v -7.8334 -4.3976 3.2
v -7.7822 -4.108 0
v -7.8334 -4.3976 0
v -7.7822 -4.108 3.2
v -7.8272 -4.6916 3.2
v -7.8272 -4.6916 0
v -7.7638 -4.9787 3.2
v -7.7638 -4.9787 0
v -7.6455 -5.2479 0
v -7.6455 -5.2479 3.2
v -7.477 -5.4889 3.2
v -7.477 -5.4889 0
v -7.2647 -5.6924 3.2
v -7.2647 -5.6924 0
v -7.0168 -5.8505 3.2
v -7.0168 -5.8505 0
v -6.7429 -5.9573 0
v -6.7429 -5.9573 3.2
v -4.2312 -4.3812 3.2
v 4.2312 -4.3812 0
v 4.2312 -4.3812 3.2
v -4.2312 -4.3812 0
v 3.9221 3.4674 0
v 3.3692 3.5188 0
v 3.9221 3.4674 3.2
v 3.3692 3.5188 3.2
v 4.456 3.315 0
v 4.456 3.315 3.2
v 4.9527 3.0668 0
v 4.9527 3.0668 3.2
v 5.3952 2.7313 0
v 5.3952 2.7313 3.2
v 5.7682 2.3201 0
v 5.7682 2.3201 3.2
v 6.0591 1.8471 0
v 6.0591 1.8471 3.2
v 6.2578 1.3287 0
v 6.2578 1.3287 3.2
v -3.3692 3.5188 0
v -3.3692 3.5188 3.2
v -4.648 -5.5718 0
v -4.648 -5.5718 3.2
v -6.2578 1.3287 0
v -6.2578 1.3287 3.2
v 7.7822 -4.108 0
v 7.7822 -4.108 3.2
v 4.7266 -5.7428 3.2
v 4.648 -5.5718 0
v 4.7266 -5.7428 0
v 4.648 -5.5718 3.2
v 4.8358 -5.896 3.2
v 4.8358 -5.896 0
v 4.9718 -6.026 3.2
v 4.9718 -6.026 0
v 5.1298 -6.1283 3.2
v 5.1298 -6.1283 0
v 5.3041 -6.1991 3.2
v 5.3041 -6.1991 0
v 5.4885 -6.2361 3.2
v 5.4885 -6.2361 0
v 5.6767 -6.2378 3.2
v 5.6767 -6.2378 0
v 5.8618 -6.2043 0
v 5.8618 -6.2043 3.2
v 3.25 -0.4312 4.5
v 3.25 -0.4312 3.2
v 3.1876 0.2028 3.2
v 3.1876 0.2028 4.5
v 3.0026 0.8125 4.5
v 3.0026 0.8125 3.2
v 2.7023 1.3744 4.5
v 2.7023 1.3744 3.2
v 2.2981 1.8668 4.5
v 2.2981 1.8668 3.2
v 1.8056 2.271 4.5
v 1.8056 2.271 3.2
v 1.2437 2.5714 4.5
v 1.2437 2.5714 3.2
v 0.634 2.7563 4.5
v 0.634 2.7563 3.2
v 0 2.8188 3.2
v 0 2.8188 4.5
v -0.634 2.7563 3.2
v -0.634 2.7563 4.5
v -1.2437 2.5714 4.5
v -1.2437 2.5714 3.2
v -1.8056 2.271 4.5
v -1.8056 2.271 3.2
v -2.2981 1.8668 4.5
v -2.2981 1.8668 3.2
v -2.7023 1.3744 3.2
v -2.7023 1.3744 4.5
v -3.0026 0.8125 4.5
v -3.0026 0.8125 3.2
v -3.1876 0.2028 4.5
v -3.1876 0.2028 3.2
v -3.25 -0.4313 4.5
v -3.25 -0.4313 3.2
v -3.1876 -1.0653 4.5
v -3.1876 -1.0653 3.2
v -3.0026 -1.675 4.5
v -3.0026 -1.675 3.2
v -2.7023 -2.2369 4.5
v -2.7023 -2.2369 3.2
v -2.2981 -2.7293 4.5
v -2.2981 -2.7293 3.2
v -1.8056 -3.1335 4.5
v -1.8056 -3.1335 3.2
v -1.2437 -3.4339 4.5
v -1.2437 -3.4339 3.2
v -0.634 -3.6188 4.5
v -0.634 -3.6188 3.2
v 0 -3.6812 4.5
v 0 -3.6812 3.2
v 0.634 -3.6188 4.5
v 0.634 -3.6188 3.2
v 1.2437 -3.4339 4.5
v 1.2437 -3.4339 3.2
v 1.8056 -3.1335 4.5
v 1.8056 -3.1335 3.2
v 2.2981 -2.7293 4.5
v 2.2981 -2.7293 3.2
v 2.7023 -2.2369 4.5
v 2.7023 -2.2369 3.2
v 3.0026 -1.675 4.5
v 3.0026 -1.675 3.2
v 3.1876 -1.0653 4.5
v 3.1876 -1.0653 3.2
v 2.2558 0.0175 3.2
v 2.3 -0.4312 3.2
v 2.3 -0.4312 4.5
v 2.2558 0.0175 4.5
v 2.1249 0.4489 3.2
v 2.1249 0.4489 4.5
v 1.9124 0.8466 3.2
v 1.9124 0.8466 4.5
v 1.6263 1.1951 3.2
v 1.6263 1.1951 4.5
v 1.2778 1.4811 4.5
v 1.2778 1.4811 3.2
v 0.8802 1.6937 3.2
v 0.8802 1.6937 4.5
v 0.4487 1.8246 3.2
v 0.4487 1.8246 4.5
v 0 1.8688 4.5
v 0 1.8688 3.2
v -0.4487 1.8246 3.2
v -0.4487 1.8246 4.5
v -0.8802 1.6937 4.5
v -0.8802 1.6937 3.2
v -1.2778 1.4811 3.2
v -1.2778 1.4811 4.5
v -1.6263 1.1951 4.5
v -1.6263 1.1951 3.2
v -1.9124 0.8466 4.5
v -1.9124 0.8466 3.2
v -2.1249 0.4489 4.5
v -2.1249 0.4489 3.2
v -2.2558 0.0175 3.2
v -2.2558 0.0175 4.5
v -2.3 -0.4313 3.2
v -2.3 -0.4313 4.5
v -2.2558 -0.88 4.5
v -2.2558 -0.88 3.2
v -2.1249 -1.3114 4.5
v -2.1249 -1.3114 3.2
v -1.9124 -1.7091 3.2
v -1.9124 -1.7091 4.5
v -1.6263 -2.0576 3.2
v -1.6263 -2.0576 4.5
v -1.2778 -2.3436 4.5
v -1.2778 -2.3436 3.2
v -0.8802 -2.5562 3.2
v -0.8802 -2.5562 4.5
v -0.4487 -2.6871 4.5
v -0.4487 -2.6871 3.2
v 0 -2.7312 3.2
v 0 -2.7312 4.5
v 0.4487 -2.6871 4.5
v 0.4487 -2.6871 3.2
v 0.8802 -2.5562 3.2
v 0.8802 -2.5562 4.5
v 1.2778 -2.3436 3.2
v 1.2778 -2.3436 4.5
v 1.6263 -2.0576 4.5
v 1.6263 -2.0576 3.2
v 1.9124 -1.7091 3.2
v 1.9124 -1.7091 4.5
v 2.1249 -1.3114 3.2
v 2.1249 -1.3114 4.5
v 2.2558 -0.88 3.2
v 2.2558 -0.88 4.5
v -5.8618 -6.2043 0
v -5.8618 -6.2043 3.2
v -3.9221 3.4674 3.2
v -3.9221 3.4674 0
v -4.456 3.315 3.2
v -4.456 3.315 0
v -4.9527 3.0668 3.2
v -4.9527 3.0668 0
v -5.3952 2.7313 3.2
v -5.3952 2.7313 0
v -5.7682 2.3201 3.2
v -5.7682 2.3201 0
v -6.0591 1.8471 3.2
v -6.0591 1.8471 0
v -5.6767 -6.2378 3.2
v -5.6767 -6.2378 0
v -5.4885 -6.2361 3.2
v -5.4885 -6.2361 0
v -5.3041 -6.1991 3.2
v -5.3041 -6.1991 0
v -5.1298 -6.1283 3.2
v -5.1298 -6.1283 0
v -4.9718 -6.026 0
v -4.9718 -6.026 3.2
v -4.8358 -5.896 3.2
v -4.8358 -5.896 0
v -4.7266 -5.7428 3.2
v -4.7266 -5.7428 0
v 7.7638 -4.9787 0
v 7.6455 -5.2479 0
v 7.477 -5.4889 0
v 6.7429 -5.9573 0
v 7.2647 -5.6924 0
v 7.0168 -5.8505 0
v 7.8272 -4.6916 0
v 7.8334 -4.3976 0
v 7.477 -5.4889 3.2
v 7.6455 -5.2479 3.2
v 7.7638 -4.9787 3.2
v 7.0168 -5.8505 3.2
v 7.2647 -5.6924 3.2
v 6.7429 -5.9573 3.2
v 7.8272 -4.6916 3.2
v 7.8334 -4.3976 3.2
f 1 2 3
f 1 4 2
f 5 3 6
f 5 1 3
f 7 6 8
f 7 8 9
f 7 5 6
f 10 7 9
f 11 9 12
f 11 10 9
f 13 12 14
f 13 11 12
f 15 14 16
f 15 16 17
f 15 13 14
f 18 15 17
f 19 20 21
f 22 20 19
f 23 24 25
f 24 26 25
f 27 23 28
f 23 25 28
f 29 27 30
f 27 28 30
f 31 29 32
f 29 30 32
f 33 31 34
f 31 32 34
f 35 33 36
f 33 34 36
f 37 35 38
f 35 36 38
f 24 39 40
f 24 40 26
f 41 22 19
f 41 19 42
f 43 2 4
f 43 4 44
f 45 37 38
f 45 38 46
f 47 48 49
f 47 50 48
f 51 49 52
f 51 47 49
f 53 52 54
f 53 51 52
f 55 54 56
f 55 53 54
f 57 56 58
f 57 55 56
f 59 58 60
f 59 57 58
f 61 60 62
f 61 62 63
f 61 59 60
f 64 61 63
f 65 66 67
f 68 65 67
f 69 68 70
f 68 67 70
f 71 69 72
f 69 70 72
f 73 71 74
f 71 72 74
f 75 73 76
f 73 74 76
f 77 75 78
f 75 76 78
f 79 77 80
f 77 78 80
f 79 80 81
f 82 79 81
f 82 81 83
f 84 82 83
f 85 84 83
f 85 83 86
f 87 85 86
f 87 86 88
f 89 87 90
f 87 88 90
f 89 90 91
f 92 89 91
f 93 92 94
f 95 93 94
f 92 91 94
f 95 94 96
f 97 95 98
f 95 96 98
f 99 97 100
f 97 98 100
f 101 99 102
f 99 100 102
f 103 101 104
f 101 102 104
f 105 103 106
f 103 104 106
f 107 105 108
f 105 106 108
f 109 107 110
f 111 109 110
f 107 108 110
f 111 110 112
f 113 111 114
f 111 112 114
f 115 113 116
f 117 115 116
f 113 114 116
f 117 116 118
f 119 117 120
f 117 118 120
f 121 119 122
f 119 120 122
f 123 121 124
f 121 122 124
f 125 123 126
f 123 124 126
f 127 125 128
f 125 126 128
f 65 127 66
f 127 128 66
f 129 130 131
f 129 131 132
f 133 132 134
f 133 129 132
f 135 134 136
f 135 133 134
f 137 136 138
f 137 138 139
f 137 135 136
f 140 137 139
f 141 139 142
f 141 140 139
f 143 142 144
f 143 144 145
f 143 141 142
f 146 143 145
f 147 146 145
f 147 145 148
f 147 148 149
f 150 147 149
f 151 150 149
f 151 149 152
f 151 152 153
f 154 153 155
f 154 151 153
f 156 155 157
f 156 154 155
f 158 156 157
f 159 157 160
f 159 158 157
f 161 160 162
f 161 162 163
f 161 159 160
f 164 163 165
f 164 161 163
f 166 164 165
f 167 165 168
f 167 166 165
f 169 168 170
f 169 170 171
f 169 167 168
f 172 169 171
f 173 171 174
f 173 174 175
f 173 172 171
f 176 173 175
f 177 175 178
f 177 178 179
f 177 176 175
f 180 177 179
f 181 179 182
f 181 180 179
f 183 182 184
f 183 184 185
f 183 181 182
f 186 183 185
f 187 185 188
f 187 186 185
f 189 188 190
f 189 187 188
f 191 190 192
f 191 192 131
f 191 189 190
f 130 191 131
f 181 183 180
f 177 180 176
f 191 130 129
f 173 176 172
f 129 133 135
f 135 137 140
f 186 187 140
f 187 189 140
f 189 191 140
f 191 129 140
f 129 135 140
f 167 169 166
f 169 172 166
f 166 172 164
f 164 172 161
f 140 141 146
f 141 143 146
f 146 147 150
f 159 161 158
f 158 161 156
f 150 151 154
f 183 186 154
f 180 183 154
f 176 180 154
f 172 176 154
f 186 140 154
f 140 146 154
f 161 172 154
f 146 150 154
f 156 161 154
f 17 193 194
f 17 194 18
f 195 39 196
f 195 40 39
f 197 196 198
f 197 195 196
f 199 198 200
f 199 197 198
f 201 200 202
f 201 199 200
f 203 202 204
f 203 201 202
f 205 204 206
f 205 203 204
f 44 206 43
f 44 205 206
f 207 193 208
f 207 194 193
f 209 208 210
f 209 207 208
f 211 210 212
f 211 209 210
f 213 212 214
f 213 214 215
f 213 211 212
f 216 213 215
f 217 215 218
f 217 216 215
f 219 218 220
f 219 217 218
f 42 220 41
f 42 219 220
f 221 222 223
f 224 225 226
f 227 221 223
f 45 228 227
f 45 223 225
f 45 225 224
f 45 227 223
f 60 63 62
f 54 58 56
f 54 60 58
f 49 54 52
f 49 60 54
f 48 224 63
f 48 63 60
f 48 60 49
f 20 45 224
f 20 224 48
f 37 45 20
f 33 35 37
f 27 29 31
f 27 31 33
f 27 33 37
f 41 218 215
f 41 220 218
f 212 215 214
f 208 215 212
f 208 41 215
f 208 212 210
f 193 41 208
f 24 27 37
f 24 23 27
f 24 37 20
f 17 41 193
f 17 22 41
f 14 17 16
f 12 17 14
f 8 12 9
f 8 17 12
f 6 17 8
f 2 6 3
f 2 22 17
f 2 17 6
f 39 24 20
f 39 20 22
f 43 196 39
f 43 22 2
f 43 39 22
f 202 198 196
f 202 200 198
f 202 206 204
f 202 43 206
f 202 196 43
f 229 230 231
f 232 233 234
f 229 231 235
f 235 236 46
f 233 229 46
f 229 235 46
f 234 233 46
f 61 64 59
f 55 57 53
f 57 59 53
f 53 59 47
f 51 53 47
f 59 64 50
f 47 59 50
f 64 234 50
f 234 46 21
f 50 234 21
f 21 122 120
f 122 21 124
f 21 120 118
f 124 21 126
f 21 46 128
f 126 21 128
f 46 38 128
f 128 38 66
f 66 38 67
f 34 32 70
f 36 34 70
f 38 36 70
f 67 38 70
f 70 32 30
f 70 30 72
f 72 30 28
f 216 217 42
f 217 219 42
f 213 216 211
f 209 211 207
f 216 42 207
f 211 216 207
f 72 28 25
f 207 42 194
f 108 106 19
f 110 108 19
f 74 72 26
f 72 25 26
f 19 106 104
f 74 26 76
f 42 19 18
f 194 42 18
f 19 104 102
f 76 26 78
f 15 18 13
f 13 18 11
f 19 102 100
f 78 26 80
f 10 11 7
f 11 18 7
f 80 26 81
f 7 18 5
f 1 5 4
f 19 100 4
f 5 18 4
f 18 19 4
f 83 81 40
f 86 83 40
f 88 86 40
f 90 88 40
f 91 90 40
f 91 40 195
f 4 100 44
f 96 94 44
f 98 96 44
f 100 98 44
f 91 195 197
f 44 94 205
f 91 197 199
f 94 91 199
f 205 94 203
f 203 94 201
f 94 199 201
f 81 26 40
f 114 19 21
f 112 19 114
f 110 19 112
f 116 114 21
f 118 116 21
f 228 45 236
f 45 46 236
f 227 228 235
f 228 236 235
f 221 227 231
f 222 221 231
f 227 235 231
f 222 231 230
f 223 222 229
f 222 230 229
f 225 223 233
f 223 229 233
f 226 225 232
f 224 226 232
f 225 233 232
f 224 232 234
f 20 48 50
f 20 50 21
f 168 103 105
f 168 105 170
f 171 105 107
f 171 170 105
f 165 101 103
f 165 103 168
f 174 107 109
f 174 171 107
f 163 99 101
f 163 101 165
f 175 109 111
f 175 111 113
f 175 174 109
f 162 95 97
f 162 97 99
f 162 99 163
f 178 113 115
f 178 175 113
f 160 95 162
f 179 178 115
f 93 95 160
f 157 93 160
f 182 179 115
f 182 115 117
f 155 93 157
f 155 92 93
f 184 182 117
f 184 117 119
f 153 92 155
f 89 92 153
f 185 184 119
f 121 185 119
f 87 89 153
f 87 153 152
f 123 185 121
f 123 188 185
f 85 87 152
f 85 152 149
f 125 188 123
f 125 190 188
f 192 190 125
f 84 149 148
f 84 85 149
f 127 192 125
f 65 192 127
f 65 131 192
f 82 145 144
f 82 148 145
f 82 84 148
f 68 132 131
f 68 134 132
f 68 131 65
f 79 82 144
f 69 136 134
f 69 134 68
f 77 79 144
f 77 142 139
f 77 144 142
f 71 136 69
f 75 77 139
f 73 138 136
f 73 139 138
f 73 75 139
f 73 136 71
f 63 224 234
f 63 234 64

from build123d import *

# Parameters (mm, degrees)
BOSS_EXTRUDE1_DEPTH = 3.2
SKETCH3_R           = 3.25
SKETCH3_R_2         = 2.3
BOSS_EXTRUDE2_DEPTH = 1.3
FILLET1_R           = 3
FILLET2_R           = 1.5
FILLET3_R           = 1


with BuildPart() as part:
    # Sketch2 → Boss-Extrude1 (new body)
    with BuildSketch(Plane.XY):
        Polygon((-5.64375, 3.51875), (5.64375, 3.51875), (8.187159214, -5.552325228), (4.958101353, -6.457710236), (4.23125, -4.38125), (-4.23125, -4.38125), (-4.958101353, -6.457710236), (-8.187159214, -5.552325228), align=None)
    extrude(amount=BOSS_EXTRUDE1_DEPTH)

    # Sketch3 → Boss-Extrude2 (add)
    with BuildSketch(Plane.XY.offset(3.2)):
        with Locations((0, -0.43125)):
            Circle(SKETCH3_R)
        with Locations((0, -0.43125)):
            Circle(SKETCH3_R_2, mode=Mode.SUBTRACT)
    extrude(amount=BOSS_EXTRUDE2_DEPTH)

    # Fillet1
    fillet1_edges = [part.edges().sort_by_distance(p)[0] for p in [
        (-5.64375, 3.51875, 1.6),
        (5.64375, 3.51875, 1.6),
    ]]
    fillet(fillet1_edges, radius=FILLET1_R)

    # Fillet2
    fillet2_edges = [part.edges().sort_by_distance(p)[0] for p in [
        (8.187159214, -5.552325228, 1.6),
        (-8.187159214, -5.552325228, 1.6),
    ]]
    fillet(fillet2_edges, radius=FILLET2_R)

    # Fillet3
    fillet3_edges = [part.edges().sort_by_distance(p)[0] for p in [
        (4.958101353, -6.457710236, 1.6),
        (-4.958101353, -6.457710236, 1.6),
    ]]
    fillet(fillet3_edges, radius=FILLET3_R)


solid = part.part
